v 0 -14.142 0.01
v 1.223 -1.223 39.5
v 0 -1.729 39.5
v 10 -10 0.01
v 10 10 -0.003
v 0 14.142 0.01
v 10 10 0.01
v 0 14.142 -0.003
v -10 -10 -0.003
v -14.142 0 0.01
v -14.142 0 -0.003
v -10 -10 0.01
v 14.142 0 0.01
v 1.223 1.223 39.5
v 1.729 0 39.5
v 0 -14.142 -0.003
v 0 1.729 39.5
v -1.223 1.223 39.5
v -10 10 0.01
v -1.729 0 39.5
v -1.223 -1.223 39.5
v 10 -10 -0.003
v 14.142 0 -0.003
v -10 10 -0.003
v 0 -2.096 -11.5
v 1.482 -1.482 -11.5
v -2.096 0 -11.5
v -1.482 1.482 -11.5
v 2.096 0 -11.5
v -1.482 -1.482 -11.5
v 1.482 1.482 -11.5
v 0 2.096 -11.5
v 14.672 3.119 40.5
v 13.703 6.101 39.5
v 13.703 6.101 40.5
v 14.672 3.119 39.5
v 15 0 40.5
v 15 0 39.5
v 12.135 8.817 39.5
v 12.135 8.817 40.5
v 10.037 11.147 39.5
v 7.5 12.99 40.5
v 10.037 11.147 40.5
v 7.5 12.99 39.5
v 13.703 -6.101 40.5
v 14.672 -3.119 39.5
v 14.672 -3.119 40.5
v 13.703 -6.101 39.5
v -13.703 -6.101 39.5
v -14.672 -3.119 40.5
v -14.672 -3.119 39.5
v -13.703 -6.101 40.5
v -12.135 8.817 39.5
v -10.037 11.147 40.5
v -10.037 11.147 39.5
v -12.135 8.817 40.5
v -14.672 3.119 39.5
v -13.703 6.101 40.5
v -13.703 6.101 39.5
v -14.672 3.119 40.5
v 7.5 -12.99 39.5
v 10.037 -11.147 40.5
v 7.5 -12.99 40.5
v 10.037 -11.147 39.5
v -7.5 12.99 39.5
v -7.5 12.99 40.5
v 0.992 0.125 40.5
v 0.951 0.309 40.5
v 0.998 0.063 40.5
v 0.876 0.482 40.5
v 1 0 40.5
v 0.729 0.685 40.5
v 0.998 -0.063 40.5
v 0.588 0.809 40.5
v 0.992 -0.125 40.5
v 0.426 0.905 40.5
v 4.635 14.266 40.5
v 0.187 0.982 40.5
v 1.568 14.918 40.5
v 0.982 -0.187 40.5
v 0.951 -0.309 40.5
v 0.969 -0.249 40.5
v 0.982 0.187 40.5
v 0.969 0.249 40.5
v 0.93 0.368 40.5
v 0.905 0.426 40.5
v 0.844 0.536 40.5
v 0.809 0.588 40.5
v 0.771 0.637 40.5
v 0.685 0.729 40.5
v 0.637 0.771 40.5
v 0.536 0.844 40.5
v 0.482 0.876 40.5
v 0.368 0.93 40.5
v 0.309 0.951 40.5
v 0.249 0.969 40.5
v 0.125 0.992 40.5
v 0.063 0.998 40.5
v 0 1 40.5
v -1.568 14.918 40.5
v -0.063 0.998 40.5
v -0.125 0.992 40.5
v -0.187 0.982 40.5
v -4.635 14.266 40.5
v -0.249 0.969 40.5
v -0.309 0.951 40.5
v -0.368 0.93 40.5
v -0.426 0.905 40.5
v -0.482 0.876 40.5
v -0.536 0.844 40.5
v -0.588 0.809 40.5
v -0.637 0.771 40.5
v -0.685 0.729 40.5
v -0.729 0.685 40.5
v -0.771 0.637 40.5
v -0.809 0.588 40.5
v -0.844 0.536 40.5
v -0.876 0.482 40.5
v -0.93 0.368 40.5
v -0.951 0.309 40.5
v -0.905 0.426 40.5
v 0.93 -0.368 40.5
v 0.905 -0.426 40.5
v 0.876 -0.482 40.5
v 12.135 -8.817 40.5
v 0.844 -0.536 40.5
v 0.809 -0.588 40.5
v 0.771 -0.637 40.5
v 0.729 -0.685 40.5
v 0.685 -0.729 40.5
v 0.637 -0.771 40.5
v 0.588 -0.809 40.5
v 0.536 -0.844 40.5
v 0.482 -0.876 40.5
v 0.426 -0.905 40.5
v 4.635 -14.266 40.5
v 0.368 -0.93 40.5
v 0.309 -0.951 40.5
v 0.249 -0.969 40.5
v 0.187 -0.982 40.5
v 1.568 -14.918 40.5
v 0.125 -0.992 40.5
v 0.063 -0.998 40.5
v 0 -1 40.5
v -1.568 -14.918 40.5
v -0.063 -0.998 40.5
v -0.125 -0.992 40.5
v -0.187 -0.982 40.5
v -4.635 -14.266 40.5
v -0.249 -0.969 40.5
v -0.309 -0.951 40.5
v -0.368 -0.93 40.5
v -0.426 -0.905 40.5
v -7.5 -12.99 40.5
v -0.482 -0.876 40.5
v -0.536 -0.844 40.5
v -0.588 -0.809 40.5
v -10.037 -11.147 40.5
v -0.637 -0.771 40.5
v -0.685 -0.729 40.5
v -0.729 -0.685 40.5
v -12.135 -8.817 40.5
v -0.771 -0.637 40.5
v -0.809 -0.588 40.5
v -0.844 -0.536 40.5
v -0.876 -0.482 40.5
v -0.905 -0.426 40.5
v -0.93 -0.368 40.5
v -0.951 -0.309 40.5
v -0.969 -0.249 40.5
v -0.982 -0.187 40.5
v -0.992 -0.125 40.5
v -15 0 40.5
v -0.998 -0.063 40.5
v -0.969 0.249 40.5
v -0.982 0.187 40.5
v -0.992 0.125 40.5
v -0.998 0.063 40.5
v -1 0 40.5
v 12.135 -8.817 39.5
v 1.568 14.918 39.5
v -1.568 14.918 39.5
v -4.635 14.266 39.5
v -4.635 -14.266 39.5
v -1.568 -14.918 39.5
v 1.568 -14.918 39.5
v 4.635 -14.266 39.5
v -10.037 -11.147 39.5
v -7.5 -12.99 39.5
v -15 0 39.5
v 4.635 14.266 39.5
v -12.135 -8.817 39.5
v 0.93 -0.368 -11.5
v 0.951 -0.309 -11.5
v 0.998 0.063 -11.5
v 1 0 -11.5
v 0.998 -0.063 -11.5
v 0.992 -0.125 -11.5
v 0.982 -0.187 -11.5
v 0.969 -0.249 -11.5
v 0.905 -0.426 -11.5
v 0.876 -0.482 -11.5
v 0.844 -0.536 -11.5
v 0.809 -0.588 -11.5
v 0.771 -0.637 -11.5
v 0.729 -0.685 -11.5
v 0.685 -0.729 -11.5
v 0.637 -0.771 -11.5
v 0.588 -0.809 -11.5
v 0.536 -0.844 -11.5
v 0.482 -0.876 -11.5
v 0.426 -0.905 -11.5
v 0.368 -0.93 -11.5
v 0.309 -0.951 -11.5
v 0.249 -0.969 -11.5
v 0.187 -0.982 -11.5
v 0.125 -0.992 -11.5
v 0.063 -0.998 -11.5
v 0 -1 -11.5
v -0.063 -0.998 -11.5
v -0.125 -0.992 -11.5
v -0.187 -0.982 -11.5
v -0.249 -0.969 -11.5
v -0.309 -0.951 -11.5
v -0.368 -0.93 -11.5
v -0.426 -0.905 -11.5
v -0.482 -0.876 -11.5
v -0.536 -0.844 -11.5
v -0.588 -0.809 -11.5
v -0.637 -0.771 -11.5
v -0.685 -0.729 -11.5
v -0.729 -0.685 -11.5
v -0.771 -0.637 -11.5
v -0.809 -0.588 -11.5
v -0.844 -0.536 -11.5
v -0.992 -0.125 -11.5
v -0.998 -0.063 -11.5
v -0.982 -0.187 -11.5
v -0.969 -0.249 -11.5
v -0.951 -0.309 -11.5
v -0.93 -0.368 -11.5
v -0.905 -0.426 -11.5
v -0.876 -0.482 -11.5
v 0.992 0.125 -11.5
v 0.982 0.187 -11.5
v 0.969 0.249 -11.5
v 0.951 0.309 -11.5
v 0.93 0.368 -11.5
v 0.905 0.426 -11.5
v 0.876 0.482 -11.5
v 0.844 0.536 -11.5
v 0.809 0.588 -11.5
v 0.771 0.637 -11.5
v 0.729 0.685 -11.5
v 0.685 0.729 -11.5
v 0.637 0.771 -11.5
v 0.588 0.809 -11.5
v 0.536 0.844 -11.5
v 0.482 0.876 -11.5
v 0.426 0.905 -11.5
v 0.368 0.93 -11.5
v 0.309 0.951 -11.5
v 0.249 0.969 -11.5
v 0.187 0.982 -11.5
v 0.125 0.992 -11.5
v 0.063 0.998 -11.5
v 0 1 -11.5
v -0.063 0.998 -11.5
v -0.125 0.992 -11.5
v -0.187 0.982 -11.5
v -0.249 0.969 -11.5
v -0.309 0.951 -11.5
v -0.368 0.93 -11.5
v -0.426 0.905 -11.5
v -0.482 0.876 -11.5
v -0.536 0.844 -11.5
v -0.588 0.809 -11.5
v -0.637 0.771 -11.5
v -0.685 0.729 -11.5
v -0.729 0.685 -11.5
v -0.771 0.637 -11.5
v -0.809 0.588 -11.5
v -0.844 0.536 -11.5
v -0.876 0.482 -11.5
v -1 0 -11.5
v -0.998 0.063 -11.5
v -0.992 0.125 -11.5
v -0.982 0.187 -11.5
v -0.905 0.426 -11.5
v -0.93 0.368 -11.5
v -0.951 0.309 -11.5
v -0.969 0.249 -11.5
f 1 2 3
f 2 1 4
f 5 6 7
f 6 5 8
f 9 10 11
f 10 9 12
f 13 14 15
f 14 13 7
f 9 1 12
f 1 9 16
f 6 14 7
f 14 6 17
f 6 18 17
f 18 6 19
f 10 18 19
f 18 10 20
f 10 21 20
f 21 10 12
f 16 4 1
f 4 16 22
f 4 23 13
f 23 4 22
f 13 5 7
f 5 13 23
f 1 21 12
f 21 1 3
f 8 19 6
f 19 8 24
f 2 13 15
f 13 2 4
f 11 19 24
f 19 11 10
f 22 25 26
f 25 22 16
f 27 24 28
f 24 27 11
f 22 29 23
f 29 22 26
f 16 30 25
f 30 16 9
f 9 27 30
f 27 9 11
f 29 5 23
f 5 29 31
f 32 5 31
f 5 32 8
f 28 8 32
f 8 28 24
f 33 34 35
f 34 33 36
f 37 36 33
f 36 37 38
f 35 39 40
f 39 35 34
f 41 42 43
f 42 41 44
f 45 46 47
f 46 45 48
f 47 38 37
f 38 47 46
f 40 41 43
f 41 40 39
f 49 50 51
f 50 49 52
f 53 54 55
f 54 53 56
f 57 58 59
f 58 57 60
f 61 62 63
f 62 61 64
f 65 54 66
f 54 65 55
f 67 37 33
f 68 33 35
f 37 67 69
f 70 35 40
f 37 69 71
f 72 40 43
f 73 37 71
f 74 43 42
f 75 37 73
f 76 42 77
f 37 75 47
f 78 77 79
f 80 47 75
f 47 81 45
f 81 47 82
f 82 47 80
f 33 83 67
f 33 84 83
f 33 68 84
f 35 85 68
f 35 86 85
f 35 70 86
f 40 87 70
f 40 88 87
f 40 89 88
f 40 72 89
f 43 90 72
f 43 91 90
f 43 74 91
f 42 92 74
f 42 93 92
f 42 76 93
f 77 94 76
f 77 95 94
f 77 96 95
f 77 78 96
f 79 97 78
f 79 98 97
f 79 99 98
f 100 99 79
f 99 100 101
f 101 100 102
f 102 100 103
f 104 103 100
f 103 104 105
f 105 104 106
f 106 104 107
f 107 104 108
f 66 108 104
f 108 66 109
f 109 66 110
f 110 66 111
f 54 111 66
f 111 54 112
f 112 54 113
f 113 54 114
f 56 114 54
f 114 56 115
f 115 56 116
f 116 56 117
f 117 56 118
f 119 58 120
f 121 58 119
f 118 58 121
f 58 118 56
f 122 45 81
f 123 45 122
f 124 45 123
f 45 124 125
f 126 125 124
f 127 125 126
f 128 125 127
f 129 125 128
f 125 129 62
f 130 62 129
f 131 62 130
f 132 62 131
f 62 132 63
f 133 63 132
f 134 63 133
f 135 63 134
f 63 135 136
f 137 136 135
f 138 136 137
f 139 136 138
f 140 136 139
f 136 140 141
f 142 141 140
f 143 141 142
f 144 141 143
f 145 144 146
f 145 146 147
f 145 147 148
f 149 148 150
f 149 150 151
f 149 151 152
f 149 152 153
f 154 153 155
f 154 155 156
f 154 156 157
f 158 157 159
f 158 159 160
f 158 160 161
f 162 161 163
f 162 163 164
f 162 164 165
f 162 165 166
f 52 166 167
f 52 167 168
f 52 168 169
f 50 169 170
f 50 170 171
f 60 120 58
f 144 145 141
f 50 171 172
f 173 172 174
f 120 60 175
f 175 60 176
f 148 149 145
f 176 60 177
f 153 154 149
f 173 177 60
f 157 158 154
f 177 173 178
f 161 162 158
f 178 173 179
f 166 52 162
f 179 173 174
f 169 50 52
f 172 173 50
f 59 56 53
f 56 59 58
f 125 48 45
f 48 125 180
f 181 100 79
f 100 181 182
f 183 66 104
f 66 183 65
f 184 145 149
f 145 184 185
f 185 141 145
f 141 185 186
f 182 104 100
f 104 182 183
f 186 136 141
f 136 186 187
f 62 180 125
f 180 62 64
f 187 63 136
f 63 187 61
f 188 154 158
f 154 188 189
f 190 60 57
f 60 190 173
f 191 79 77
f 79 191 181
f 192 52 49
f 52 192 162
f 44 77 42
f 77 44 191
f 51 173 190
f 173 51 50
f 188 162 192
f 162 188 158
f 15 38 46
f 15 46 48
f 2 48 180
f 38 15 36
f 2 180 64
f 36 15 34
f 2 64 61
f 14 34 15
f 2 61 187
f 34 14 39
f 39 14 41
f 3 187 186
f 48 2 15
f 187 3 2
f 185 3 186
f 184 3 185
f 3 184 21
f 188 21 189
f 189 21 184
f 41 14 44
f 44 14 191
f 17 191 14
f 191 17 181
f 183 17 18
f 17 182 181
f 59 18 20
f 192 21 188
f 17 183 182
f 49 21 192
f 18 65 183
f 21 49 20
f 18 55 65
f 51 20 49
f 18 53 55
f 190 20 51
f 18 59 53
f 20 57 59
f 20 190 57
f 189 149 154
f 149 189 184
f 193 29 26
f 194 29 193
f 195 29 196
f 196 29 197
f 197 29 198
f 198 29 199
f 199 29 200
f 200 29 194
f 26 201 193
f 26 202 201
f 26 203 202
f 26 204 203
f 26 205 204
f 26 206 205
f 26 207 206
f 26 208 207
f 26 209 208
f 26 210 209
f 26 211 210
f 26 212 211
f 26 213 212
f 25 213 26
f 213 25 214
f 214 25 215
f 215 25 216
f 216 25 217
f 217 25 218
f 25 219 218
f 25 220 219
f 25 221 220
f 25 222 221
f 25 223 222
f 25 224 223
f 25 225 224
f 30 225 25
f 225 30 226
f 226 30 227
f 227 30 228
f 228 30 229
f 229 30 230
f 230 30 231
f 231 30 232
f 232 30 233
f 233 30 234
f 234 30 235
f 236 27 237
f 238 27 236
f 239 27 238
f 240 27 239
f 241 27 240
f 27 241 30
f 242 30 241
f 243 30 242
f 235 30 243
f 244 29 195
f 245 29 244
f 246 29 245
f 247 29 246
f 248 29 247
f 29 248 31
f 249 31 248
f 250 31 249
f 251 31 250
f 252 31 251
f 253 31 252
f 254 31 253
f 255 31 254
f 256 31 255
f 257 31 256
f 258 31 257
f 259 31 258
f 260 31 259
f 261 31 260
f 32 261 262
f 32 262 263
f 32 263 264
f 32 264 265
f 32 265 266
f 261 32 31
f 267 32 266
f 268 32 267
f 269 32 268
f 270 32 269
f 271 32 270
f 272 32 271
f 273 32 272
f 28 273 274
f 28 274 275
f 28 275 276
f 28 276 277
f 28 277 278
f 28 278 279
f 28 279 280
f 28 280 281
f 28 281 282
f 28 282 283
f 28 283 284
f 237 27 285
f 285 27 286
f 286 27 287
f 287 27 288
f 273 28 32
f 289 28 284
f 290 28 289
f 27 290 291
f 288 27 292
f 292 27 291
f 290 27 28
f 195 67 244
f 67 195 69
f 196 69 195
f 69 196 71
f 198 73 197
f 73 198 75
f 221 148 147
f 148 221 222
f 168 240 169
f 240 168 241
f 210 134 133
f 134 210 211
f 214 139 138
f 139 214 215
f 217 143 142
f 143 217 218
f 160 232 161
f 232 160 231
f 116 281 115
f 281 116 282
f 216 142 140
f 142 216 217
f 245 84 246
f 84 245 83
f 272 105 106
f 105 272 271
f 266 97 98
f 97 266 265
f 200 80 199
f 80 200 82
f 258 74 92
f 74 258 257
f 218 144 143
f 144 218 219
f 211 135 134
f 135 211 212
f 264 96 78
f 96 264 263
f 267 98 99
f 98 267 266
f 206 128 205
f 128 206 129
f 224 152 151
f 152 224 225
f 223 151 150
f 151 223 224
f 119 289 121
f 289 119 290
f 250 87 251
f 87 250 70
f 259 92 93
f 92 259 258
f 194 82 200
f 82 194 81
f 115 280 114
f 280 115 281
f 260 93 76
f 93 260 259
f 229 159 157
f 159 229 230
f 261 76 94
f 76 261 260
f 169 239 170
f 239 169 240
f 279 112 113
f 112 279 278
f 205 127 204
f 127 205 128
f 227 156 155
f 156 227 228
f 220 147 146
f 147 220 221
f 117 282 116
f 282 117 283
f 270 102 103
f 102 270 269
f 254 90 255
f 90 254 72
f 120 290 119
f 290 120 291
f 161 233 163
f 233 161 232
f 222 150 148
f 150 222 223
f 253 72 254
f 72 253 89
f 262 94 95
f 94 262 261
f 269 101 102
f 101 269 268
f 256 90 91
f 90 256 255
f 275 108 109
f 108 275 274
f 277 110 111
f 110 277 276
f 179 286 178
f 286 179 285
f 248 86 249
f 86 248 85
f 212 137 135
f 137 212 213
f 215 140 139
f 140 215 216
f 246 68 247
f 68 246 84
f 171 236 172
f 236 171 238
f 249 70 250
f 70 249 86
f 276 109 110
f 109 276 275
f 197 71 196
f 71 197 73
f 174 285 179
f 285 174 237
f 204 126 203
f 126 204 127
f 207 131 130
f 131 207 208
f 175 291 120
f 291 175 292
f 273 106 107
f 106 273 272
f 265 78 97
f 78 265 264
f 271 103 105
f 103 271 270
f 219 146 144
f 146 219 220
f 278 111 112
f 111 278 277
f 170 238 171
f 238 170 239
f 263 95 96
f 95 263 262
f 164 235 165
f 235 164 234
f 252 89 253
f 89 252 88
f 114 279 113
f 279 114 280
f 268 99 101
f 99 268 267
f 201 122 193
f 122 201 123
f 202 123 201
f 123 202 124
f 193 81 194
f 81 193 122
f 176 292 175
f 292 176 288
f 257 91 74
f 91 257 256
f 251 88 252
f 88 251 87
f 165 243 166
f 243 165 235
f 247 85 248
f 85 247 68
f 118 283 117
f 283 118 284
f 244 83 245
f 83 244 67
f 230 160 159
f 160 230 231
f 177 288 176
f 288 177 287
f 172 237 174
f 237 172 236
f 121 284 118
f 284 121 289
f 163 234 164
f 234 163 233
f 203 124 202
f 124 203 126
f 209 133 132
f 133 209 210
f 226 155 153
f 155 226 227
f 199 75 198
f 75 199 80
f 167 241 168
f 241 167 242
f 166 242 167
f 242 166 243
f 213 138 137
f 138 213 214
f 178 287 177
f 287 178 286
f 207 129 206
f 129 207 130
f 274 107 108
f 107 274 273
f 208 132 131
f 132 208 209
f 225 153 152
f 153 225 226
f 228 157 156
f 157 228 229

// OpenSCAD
// file: KlaudiaNeckPendantMaster.scad
module PendantPrimitive()
{
   hull()
   { 
       linear_extrude(0.01)
       { 
           polygon(
             points=[ [10,10],[10*sqrt(2),0],[10,-10],[0,-10*sqrt(2)],
                      [-10,-10],[-10*sqrt(2),0],[-10,10],[0,10*sqrt(2)] ] // the 8 points at base
           );
       }
       translate([0,0,45]) cube(0.001,center=true);
   }   
}

module KlaudiaNeckPendant()
{
    difference()
    {
        
       union()
       {
           intersection()
           {
               union()
               {
                    PendantPrimitive();
                    scale([1,1,0.3]) mirror([0,0,1])PendantPrimitive();
               }
               cube(79.1,center=true);
           }
            // This part is broken off after the part is printed.   
            translate([0,0,40]) cylinder(d=30,h=1,center=true);
       } 
       difference()
       {
           translate([0,0,-14]) cube(5,center=true);
       } 
       // This hole through the length of this pendant ensures the resin drains out as it is printed. 
       cylinder(d=2,h=200,$fn=100,center=true);
    }
}

module KlaudiaNeckPendantCap()
{
    difference()
    {
        intersection()
        {
            scale([1.15,1.15,1.15])PendantPrimitive();
            translate([0,0,40]) cube([15,15,15],center=true);
        }
        PendantPrimitive();        
        translate([0,0,43]) rotate([0,90,0]) cylinder(d=3,h=200,$fn=100,center=true);
        // This hole through the length of this pendant ensures the resin drains out as it is printed. 
        cylinder(d=2,h=200,$fn=100,center=true);
    }
}

//KlaudiaNeckPendant();
//KlaudiaNeckPendantCap();
// main file
include <KlaudiaNeckPendantMaster.scad>;

KlaudiaNeckPendant();
